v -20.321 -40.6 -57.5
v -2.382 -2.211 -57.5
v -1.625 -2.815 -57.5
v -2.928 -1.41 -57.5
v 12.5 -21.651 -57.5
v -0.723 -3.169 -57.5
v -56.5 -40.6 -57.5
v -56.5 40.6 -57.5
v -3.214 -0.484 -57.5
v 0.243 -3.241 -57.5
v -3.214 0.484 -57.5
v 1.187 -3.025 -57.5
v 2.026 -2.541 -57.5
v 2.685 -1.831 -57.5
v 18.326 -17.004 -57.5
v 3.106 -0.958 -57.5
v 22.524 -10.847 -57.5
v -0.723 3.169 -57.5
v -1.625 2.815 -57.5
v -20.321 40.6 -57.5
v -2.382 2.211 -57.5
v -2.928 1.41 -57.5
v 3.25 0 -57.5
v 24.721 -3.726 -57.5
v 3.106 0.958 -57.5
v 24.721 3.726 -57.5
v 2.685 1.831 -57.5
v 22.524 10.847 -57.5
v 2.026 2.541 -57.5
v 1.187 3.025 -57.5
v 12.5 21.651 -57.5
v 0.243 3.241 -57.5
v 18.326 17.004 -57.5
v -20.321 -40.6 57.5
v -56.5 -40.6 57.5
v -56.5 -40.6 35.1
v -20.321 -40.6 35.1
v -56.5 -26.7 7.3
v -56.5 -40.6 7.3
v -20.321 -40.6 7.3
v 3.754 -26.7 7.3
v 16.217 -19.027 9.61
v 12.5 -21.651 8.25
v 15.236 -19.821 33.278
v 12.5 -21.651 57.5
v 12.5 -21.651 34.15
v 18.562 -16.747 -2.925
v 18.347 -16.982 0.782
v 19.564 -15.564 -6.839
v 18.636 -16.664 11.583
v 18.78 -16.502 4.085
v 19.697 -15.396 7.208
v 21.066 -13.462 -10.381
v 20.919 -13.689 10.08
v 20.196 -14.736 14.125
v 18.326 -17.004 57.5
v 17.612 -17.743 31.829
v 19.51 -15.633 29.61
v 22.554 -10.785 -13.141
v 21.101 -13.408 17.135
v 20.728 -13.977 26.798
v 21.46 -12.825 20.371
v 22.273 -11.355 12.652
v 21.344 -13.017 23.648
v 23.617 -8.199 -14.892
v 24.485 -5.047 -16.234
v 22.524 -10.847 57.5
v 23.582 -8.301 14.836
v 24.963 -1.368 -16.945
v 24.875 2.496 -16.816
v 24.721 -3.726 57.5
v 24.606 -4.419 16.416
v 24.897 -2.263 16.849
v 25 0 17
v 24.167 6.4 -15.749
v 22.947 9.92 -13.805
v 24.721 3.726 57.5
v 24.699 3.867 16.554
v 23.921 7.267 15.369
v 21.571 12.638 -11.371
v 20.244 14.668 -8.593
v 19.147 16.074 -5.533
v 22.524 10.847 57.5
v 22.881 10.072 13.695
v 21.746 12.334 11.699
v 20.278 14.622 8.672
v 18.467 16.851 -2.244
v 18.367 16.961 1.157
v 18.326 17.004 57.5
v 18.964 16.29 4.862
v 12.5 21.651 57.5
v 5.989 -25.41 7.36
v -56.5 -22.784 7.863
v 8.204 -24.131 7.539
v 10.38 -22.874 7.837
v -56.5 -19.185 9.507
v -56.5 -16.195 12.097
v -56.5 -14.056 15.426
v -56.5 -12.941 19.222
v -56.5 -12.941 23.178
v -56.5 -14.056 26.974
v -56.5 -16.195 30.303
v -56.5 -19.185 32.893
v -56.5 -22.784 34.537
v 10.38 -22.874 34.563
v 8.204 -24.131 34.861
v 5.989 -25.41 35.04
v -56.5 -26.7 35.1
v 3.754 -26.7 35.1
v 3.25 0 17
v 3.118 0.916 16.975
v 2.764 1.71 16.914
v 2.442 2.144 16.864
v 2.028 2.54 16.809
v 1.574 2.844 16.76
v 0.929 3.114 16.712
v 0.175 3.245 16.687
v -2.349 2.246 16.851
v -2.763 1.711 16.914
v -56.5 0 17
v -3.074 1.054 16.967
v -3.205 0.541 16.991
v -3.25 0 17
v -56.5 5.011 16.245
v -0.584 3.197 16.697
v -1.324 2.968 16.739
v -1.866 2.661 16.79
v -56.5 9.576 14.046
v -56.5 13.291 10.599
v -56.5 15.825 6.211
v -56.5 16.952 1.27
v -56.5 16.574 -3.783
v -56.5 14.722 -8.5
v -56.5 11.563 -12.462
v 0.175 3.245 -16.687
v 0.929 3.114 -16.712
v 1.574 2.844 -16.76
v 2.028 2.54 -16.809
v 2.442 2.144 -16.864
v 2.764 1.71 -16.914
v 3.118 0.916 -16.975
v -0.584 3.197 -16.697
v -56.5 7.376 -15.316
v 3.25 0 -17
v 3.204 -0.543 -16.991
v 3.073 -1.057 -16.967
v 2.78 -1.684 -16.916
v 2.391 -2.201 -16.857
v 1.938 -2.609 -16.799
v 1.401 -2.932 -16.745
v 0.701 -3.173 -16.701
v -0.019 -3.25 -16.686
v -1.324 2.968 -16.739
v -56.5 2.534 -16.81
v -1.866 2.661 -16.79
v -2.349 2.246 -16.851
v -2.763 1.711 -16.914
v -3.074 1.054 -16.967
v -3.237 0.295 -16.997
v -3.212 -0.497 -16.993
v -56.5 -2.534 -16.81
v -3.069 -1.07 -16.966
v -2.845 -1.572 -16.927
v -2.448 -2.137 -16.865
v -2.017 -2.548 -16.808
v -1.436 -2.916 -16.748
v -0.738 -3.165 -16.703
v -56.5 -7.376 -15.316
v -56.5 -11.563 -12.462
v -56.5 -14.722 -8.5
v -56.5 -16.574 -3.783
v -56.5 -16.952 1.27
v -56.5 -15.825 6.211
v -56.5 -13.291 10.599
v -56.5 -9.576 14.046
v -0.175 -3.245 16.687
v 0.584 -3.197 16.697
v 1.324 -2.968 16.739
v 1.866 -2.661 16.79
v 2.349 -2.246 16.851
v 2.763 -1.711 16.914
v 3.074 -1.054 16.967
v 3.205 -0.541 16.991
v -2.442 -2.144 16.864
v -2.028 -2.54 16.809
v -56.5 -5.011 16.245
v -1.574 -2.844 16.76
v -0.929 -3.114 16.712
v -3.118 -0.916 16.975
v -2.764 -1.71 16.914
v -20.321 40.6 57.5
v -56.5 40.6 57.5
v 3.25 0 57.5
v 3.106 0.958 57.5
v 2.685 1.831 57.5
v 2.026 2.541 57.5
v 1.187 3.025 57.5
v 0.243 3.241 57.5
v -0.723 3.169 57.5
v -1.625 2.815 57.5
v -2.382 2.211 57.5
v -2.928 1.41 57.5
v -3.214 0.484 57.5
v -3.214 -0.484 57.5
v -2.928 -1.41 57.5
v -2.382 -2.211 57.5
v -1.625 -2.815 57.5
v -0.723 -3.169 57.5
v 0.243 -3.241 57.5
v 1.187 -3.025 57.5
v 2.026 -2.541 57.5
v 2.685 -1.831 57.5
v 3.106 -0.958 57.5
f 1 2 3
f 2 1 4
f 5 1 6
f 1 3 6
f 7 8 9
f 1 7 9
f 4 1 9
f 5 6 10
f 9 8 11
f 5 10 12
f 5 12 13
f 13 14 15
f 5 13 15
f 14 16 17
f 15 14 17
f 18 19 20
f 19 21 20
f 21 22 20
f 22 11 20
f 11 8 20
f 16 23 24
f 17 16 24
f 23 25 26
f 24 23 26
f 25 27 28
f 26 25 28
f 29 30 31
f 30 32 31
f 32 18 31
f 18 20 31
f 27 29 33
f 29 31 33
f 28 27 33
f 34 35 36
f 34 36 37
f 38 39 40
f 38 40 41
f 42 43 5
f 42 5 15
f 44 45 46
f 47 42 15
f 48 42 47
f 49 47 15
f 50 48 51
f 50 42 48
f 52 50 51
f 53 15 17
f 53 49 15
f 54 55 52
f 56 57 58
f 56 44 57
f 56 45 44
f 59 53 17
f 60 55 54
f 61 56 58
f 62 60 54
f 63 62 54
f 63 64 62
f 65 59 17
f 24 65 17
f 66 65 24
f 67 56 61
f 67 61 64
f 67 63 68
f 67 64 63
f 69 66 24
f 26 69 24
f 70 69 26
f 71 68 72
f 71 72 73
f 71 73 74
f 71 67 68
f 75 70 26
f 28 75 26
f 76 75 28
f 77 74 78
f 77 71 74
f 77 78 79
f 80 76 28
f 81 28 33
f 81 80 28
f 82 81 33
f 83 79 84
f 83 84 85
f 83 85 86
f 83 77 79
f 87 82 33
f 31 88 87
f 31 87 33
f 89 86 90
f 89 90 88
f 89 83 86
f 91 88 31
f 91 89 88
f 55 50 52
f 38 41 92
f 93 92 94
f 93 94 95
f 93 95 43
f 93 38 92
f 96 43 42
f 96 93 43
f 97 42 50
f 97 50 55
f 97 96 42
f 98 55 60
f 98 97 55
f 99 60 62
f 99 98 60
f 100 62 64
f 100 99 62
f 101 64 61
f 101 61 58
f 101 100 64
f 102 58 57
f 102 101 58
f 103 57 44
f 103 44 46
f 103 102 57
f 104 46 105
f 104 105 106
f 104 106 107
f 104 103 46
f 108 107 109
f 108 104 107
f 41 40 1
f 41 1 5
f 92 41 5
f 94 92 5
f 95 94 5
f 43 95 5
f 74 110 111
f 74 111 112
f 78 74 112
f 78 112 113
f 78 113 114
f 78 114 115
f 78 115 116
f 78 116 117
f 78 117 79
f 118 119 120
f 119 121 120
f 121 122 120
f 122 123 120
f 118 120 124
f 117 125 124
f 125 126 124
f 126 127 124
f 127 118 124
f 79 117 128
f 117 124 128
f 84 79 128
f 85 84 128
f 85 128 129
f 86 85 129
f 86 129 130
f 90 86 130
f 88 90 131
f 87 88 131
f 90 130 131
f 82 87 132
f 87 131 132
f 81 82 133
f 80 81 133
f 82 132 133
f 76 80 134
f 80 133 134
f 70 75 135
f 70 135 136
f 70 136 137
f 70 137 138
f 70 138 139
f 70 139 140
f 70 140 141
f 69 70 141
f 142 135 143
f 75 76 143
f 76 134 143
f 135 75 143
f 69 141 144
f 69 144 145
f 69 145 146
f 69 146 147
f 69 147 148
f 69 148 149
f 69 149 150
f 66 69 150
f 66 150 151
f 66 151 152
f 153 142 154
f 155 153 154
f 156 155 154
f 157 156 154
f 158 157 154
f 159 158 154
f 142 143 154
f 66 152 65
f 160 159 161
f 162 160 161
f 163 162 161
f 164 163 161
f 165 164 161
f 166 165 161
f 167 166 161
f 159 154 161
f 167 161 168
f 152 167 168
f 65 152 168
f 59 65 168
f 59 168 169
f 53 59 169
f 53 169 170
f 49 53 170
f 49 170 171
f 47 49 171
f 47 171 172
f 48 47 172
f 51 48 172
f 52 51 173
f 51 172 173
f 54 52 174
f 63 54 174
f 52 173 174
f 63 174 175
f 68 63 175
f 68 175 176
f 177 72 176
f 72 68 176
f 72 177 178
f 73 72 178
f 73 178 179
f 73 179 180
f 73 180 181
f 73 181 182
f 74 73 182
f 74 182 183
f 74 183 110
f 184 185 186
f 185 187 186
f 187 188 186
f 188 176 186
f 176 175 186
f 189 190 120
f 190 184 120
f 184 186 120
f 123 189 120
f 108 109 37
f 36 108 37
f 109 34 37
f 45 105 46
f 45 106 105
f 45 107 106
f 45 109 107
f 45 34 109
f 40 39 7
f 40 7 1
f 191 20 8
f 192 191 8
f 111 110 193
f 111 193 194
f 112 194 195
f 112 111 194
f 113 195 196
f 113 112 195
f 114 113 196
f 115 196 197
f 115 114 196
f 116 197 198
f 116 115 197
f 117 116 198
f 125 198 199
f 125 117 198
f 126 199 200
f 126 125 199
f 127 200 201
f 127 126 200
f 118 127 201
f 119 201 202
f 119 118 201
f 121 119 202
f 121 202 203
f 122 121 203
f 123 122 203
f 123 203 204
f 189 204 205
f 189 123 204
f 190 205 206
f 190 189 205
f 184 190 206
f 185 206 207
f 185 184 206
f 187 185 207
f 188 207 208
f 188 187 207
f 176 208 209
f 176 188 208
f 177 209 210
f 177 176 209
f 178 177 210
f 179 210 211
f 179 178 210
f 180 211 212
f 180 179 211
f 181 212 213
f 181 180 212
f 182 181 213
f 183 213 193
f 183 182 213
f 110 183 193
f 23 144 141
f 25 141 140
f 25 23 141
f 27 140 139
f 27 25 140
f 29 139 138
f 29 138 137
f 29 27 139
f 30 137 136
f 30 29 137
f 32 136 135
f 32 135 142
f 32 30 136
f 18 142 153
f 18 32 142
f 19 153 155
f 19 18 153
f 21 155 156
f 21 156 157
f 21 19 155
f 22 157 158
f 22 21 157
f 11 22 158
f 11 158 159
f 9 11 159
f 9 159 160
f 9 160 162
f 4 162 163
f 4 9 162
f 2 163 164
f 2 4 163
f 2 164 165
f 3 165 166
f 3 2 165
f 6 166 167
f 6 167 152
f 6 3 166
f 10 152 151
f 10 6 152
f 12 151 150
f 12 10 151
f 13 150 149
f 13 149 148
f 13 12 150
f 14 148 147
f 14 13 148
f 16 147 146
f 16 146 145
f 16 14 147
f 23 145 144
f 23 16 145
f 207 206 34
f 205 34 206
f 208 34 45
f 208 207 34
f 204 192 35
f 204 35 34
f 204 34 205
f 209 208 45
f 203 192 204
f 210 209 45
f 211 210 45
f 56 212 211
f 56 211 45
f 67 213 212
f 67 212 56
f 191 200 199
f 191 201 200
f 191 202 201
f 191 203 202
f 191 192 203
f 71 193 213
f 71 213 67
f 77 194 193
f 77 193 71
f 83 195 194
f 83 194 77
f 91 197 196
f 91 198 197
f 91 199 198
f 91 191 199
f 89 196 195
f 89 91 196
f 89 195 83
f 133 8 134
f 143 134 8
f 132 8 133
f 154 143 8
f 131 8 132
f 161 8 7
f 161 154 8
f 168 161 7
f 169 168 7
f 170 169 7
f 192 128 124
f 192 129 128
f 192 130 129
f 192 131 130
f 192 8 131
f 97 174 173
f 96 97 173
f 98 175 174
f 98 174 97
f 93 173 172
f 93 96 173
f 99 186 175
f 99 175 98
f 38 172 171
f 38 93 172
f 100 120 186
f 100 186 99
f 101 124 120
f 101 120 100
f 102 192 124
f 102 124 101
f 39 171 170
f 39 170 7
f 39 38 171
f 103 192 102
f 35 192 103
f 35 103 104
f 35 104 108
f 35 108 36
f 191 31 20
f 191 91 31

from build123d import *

# Parameters (mm, degrees)
ESQUISSE2_R      = 3.25
EXTRUSION1_DEPTH = 57.5
ESQUISSE5_R      = 17
EXTRUSION3_DEPTH = 108.688718072


with BuildPart() as part:
    # Esquisse2 → Extrusion1 (new, symmetric)
    with BuildSketch(Plane.XY):
        with BuildLine():
            Line((-56.5, 40.6), (-56.5, -40.6))
            Line((-56.5, -40.6), (-20.321262787, -40.6))
            Line((-20.321262787, -40.6), (12.5, -21.650635095))
            ThreePointArc((12.5, -21.650635095), (25, 0), (12.5, 21.650635095))
            Line((12.5, 21.650635095), (-20.321262787, 40.6))
            Line((-20.321262787, 40.6), (-56.5, 40.6))
        make_face()
        Circle(ESQUISSE2_R, mode=Mode.SUBTRACT)
    extrude(amount=EXTRUSION1_DEPTH, both=True)

    # Esquisse5 → Extrusion3 (cut, through all)
    with BuildSketch(Plane.ZY.offset(56.5)):
        Circle(ESQUISSE5_R)
        with BuildLine():
            Line((7.3, -40.6), (7.3, -26.7))
            ThreePointArc((7.3, -26.7), (21.2, -12.8), (35.1, -26.7))
            Line((35.1, -26.7), (35.1, -40.6))
            Line((35.1, -40.6), (7.3, -40.6))
        make_face()
    extrude(amount=-EXTRUSION3_DEPTH, mode=Mode.SUBTRACT)


solid = part.part
